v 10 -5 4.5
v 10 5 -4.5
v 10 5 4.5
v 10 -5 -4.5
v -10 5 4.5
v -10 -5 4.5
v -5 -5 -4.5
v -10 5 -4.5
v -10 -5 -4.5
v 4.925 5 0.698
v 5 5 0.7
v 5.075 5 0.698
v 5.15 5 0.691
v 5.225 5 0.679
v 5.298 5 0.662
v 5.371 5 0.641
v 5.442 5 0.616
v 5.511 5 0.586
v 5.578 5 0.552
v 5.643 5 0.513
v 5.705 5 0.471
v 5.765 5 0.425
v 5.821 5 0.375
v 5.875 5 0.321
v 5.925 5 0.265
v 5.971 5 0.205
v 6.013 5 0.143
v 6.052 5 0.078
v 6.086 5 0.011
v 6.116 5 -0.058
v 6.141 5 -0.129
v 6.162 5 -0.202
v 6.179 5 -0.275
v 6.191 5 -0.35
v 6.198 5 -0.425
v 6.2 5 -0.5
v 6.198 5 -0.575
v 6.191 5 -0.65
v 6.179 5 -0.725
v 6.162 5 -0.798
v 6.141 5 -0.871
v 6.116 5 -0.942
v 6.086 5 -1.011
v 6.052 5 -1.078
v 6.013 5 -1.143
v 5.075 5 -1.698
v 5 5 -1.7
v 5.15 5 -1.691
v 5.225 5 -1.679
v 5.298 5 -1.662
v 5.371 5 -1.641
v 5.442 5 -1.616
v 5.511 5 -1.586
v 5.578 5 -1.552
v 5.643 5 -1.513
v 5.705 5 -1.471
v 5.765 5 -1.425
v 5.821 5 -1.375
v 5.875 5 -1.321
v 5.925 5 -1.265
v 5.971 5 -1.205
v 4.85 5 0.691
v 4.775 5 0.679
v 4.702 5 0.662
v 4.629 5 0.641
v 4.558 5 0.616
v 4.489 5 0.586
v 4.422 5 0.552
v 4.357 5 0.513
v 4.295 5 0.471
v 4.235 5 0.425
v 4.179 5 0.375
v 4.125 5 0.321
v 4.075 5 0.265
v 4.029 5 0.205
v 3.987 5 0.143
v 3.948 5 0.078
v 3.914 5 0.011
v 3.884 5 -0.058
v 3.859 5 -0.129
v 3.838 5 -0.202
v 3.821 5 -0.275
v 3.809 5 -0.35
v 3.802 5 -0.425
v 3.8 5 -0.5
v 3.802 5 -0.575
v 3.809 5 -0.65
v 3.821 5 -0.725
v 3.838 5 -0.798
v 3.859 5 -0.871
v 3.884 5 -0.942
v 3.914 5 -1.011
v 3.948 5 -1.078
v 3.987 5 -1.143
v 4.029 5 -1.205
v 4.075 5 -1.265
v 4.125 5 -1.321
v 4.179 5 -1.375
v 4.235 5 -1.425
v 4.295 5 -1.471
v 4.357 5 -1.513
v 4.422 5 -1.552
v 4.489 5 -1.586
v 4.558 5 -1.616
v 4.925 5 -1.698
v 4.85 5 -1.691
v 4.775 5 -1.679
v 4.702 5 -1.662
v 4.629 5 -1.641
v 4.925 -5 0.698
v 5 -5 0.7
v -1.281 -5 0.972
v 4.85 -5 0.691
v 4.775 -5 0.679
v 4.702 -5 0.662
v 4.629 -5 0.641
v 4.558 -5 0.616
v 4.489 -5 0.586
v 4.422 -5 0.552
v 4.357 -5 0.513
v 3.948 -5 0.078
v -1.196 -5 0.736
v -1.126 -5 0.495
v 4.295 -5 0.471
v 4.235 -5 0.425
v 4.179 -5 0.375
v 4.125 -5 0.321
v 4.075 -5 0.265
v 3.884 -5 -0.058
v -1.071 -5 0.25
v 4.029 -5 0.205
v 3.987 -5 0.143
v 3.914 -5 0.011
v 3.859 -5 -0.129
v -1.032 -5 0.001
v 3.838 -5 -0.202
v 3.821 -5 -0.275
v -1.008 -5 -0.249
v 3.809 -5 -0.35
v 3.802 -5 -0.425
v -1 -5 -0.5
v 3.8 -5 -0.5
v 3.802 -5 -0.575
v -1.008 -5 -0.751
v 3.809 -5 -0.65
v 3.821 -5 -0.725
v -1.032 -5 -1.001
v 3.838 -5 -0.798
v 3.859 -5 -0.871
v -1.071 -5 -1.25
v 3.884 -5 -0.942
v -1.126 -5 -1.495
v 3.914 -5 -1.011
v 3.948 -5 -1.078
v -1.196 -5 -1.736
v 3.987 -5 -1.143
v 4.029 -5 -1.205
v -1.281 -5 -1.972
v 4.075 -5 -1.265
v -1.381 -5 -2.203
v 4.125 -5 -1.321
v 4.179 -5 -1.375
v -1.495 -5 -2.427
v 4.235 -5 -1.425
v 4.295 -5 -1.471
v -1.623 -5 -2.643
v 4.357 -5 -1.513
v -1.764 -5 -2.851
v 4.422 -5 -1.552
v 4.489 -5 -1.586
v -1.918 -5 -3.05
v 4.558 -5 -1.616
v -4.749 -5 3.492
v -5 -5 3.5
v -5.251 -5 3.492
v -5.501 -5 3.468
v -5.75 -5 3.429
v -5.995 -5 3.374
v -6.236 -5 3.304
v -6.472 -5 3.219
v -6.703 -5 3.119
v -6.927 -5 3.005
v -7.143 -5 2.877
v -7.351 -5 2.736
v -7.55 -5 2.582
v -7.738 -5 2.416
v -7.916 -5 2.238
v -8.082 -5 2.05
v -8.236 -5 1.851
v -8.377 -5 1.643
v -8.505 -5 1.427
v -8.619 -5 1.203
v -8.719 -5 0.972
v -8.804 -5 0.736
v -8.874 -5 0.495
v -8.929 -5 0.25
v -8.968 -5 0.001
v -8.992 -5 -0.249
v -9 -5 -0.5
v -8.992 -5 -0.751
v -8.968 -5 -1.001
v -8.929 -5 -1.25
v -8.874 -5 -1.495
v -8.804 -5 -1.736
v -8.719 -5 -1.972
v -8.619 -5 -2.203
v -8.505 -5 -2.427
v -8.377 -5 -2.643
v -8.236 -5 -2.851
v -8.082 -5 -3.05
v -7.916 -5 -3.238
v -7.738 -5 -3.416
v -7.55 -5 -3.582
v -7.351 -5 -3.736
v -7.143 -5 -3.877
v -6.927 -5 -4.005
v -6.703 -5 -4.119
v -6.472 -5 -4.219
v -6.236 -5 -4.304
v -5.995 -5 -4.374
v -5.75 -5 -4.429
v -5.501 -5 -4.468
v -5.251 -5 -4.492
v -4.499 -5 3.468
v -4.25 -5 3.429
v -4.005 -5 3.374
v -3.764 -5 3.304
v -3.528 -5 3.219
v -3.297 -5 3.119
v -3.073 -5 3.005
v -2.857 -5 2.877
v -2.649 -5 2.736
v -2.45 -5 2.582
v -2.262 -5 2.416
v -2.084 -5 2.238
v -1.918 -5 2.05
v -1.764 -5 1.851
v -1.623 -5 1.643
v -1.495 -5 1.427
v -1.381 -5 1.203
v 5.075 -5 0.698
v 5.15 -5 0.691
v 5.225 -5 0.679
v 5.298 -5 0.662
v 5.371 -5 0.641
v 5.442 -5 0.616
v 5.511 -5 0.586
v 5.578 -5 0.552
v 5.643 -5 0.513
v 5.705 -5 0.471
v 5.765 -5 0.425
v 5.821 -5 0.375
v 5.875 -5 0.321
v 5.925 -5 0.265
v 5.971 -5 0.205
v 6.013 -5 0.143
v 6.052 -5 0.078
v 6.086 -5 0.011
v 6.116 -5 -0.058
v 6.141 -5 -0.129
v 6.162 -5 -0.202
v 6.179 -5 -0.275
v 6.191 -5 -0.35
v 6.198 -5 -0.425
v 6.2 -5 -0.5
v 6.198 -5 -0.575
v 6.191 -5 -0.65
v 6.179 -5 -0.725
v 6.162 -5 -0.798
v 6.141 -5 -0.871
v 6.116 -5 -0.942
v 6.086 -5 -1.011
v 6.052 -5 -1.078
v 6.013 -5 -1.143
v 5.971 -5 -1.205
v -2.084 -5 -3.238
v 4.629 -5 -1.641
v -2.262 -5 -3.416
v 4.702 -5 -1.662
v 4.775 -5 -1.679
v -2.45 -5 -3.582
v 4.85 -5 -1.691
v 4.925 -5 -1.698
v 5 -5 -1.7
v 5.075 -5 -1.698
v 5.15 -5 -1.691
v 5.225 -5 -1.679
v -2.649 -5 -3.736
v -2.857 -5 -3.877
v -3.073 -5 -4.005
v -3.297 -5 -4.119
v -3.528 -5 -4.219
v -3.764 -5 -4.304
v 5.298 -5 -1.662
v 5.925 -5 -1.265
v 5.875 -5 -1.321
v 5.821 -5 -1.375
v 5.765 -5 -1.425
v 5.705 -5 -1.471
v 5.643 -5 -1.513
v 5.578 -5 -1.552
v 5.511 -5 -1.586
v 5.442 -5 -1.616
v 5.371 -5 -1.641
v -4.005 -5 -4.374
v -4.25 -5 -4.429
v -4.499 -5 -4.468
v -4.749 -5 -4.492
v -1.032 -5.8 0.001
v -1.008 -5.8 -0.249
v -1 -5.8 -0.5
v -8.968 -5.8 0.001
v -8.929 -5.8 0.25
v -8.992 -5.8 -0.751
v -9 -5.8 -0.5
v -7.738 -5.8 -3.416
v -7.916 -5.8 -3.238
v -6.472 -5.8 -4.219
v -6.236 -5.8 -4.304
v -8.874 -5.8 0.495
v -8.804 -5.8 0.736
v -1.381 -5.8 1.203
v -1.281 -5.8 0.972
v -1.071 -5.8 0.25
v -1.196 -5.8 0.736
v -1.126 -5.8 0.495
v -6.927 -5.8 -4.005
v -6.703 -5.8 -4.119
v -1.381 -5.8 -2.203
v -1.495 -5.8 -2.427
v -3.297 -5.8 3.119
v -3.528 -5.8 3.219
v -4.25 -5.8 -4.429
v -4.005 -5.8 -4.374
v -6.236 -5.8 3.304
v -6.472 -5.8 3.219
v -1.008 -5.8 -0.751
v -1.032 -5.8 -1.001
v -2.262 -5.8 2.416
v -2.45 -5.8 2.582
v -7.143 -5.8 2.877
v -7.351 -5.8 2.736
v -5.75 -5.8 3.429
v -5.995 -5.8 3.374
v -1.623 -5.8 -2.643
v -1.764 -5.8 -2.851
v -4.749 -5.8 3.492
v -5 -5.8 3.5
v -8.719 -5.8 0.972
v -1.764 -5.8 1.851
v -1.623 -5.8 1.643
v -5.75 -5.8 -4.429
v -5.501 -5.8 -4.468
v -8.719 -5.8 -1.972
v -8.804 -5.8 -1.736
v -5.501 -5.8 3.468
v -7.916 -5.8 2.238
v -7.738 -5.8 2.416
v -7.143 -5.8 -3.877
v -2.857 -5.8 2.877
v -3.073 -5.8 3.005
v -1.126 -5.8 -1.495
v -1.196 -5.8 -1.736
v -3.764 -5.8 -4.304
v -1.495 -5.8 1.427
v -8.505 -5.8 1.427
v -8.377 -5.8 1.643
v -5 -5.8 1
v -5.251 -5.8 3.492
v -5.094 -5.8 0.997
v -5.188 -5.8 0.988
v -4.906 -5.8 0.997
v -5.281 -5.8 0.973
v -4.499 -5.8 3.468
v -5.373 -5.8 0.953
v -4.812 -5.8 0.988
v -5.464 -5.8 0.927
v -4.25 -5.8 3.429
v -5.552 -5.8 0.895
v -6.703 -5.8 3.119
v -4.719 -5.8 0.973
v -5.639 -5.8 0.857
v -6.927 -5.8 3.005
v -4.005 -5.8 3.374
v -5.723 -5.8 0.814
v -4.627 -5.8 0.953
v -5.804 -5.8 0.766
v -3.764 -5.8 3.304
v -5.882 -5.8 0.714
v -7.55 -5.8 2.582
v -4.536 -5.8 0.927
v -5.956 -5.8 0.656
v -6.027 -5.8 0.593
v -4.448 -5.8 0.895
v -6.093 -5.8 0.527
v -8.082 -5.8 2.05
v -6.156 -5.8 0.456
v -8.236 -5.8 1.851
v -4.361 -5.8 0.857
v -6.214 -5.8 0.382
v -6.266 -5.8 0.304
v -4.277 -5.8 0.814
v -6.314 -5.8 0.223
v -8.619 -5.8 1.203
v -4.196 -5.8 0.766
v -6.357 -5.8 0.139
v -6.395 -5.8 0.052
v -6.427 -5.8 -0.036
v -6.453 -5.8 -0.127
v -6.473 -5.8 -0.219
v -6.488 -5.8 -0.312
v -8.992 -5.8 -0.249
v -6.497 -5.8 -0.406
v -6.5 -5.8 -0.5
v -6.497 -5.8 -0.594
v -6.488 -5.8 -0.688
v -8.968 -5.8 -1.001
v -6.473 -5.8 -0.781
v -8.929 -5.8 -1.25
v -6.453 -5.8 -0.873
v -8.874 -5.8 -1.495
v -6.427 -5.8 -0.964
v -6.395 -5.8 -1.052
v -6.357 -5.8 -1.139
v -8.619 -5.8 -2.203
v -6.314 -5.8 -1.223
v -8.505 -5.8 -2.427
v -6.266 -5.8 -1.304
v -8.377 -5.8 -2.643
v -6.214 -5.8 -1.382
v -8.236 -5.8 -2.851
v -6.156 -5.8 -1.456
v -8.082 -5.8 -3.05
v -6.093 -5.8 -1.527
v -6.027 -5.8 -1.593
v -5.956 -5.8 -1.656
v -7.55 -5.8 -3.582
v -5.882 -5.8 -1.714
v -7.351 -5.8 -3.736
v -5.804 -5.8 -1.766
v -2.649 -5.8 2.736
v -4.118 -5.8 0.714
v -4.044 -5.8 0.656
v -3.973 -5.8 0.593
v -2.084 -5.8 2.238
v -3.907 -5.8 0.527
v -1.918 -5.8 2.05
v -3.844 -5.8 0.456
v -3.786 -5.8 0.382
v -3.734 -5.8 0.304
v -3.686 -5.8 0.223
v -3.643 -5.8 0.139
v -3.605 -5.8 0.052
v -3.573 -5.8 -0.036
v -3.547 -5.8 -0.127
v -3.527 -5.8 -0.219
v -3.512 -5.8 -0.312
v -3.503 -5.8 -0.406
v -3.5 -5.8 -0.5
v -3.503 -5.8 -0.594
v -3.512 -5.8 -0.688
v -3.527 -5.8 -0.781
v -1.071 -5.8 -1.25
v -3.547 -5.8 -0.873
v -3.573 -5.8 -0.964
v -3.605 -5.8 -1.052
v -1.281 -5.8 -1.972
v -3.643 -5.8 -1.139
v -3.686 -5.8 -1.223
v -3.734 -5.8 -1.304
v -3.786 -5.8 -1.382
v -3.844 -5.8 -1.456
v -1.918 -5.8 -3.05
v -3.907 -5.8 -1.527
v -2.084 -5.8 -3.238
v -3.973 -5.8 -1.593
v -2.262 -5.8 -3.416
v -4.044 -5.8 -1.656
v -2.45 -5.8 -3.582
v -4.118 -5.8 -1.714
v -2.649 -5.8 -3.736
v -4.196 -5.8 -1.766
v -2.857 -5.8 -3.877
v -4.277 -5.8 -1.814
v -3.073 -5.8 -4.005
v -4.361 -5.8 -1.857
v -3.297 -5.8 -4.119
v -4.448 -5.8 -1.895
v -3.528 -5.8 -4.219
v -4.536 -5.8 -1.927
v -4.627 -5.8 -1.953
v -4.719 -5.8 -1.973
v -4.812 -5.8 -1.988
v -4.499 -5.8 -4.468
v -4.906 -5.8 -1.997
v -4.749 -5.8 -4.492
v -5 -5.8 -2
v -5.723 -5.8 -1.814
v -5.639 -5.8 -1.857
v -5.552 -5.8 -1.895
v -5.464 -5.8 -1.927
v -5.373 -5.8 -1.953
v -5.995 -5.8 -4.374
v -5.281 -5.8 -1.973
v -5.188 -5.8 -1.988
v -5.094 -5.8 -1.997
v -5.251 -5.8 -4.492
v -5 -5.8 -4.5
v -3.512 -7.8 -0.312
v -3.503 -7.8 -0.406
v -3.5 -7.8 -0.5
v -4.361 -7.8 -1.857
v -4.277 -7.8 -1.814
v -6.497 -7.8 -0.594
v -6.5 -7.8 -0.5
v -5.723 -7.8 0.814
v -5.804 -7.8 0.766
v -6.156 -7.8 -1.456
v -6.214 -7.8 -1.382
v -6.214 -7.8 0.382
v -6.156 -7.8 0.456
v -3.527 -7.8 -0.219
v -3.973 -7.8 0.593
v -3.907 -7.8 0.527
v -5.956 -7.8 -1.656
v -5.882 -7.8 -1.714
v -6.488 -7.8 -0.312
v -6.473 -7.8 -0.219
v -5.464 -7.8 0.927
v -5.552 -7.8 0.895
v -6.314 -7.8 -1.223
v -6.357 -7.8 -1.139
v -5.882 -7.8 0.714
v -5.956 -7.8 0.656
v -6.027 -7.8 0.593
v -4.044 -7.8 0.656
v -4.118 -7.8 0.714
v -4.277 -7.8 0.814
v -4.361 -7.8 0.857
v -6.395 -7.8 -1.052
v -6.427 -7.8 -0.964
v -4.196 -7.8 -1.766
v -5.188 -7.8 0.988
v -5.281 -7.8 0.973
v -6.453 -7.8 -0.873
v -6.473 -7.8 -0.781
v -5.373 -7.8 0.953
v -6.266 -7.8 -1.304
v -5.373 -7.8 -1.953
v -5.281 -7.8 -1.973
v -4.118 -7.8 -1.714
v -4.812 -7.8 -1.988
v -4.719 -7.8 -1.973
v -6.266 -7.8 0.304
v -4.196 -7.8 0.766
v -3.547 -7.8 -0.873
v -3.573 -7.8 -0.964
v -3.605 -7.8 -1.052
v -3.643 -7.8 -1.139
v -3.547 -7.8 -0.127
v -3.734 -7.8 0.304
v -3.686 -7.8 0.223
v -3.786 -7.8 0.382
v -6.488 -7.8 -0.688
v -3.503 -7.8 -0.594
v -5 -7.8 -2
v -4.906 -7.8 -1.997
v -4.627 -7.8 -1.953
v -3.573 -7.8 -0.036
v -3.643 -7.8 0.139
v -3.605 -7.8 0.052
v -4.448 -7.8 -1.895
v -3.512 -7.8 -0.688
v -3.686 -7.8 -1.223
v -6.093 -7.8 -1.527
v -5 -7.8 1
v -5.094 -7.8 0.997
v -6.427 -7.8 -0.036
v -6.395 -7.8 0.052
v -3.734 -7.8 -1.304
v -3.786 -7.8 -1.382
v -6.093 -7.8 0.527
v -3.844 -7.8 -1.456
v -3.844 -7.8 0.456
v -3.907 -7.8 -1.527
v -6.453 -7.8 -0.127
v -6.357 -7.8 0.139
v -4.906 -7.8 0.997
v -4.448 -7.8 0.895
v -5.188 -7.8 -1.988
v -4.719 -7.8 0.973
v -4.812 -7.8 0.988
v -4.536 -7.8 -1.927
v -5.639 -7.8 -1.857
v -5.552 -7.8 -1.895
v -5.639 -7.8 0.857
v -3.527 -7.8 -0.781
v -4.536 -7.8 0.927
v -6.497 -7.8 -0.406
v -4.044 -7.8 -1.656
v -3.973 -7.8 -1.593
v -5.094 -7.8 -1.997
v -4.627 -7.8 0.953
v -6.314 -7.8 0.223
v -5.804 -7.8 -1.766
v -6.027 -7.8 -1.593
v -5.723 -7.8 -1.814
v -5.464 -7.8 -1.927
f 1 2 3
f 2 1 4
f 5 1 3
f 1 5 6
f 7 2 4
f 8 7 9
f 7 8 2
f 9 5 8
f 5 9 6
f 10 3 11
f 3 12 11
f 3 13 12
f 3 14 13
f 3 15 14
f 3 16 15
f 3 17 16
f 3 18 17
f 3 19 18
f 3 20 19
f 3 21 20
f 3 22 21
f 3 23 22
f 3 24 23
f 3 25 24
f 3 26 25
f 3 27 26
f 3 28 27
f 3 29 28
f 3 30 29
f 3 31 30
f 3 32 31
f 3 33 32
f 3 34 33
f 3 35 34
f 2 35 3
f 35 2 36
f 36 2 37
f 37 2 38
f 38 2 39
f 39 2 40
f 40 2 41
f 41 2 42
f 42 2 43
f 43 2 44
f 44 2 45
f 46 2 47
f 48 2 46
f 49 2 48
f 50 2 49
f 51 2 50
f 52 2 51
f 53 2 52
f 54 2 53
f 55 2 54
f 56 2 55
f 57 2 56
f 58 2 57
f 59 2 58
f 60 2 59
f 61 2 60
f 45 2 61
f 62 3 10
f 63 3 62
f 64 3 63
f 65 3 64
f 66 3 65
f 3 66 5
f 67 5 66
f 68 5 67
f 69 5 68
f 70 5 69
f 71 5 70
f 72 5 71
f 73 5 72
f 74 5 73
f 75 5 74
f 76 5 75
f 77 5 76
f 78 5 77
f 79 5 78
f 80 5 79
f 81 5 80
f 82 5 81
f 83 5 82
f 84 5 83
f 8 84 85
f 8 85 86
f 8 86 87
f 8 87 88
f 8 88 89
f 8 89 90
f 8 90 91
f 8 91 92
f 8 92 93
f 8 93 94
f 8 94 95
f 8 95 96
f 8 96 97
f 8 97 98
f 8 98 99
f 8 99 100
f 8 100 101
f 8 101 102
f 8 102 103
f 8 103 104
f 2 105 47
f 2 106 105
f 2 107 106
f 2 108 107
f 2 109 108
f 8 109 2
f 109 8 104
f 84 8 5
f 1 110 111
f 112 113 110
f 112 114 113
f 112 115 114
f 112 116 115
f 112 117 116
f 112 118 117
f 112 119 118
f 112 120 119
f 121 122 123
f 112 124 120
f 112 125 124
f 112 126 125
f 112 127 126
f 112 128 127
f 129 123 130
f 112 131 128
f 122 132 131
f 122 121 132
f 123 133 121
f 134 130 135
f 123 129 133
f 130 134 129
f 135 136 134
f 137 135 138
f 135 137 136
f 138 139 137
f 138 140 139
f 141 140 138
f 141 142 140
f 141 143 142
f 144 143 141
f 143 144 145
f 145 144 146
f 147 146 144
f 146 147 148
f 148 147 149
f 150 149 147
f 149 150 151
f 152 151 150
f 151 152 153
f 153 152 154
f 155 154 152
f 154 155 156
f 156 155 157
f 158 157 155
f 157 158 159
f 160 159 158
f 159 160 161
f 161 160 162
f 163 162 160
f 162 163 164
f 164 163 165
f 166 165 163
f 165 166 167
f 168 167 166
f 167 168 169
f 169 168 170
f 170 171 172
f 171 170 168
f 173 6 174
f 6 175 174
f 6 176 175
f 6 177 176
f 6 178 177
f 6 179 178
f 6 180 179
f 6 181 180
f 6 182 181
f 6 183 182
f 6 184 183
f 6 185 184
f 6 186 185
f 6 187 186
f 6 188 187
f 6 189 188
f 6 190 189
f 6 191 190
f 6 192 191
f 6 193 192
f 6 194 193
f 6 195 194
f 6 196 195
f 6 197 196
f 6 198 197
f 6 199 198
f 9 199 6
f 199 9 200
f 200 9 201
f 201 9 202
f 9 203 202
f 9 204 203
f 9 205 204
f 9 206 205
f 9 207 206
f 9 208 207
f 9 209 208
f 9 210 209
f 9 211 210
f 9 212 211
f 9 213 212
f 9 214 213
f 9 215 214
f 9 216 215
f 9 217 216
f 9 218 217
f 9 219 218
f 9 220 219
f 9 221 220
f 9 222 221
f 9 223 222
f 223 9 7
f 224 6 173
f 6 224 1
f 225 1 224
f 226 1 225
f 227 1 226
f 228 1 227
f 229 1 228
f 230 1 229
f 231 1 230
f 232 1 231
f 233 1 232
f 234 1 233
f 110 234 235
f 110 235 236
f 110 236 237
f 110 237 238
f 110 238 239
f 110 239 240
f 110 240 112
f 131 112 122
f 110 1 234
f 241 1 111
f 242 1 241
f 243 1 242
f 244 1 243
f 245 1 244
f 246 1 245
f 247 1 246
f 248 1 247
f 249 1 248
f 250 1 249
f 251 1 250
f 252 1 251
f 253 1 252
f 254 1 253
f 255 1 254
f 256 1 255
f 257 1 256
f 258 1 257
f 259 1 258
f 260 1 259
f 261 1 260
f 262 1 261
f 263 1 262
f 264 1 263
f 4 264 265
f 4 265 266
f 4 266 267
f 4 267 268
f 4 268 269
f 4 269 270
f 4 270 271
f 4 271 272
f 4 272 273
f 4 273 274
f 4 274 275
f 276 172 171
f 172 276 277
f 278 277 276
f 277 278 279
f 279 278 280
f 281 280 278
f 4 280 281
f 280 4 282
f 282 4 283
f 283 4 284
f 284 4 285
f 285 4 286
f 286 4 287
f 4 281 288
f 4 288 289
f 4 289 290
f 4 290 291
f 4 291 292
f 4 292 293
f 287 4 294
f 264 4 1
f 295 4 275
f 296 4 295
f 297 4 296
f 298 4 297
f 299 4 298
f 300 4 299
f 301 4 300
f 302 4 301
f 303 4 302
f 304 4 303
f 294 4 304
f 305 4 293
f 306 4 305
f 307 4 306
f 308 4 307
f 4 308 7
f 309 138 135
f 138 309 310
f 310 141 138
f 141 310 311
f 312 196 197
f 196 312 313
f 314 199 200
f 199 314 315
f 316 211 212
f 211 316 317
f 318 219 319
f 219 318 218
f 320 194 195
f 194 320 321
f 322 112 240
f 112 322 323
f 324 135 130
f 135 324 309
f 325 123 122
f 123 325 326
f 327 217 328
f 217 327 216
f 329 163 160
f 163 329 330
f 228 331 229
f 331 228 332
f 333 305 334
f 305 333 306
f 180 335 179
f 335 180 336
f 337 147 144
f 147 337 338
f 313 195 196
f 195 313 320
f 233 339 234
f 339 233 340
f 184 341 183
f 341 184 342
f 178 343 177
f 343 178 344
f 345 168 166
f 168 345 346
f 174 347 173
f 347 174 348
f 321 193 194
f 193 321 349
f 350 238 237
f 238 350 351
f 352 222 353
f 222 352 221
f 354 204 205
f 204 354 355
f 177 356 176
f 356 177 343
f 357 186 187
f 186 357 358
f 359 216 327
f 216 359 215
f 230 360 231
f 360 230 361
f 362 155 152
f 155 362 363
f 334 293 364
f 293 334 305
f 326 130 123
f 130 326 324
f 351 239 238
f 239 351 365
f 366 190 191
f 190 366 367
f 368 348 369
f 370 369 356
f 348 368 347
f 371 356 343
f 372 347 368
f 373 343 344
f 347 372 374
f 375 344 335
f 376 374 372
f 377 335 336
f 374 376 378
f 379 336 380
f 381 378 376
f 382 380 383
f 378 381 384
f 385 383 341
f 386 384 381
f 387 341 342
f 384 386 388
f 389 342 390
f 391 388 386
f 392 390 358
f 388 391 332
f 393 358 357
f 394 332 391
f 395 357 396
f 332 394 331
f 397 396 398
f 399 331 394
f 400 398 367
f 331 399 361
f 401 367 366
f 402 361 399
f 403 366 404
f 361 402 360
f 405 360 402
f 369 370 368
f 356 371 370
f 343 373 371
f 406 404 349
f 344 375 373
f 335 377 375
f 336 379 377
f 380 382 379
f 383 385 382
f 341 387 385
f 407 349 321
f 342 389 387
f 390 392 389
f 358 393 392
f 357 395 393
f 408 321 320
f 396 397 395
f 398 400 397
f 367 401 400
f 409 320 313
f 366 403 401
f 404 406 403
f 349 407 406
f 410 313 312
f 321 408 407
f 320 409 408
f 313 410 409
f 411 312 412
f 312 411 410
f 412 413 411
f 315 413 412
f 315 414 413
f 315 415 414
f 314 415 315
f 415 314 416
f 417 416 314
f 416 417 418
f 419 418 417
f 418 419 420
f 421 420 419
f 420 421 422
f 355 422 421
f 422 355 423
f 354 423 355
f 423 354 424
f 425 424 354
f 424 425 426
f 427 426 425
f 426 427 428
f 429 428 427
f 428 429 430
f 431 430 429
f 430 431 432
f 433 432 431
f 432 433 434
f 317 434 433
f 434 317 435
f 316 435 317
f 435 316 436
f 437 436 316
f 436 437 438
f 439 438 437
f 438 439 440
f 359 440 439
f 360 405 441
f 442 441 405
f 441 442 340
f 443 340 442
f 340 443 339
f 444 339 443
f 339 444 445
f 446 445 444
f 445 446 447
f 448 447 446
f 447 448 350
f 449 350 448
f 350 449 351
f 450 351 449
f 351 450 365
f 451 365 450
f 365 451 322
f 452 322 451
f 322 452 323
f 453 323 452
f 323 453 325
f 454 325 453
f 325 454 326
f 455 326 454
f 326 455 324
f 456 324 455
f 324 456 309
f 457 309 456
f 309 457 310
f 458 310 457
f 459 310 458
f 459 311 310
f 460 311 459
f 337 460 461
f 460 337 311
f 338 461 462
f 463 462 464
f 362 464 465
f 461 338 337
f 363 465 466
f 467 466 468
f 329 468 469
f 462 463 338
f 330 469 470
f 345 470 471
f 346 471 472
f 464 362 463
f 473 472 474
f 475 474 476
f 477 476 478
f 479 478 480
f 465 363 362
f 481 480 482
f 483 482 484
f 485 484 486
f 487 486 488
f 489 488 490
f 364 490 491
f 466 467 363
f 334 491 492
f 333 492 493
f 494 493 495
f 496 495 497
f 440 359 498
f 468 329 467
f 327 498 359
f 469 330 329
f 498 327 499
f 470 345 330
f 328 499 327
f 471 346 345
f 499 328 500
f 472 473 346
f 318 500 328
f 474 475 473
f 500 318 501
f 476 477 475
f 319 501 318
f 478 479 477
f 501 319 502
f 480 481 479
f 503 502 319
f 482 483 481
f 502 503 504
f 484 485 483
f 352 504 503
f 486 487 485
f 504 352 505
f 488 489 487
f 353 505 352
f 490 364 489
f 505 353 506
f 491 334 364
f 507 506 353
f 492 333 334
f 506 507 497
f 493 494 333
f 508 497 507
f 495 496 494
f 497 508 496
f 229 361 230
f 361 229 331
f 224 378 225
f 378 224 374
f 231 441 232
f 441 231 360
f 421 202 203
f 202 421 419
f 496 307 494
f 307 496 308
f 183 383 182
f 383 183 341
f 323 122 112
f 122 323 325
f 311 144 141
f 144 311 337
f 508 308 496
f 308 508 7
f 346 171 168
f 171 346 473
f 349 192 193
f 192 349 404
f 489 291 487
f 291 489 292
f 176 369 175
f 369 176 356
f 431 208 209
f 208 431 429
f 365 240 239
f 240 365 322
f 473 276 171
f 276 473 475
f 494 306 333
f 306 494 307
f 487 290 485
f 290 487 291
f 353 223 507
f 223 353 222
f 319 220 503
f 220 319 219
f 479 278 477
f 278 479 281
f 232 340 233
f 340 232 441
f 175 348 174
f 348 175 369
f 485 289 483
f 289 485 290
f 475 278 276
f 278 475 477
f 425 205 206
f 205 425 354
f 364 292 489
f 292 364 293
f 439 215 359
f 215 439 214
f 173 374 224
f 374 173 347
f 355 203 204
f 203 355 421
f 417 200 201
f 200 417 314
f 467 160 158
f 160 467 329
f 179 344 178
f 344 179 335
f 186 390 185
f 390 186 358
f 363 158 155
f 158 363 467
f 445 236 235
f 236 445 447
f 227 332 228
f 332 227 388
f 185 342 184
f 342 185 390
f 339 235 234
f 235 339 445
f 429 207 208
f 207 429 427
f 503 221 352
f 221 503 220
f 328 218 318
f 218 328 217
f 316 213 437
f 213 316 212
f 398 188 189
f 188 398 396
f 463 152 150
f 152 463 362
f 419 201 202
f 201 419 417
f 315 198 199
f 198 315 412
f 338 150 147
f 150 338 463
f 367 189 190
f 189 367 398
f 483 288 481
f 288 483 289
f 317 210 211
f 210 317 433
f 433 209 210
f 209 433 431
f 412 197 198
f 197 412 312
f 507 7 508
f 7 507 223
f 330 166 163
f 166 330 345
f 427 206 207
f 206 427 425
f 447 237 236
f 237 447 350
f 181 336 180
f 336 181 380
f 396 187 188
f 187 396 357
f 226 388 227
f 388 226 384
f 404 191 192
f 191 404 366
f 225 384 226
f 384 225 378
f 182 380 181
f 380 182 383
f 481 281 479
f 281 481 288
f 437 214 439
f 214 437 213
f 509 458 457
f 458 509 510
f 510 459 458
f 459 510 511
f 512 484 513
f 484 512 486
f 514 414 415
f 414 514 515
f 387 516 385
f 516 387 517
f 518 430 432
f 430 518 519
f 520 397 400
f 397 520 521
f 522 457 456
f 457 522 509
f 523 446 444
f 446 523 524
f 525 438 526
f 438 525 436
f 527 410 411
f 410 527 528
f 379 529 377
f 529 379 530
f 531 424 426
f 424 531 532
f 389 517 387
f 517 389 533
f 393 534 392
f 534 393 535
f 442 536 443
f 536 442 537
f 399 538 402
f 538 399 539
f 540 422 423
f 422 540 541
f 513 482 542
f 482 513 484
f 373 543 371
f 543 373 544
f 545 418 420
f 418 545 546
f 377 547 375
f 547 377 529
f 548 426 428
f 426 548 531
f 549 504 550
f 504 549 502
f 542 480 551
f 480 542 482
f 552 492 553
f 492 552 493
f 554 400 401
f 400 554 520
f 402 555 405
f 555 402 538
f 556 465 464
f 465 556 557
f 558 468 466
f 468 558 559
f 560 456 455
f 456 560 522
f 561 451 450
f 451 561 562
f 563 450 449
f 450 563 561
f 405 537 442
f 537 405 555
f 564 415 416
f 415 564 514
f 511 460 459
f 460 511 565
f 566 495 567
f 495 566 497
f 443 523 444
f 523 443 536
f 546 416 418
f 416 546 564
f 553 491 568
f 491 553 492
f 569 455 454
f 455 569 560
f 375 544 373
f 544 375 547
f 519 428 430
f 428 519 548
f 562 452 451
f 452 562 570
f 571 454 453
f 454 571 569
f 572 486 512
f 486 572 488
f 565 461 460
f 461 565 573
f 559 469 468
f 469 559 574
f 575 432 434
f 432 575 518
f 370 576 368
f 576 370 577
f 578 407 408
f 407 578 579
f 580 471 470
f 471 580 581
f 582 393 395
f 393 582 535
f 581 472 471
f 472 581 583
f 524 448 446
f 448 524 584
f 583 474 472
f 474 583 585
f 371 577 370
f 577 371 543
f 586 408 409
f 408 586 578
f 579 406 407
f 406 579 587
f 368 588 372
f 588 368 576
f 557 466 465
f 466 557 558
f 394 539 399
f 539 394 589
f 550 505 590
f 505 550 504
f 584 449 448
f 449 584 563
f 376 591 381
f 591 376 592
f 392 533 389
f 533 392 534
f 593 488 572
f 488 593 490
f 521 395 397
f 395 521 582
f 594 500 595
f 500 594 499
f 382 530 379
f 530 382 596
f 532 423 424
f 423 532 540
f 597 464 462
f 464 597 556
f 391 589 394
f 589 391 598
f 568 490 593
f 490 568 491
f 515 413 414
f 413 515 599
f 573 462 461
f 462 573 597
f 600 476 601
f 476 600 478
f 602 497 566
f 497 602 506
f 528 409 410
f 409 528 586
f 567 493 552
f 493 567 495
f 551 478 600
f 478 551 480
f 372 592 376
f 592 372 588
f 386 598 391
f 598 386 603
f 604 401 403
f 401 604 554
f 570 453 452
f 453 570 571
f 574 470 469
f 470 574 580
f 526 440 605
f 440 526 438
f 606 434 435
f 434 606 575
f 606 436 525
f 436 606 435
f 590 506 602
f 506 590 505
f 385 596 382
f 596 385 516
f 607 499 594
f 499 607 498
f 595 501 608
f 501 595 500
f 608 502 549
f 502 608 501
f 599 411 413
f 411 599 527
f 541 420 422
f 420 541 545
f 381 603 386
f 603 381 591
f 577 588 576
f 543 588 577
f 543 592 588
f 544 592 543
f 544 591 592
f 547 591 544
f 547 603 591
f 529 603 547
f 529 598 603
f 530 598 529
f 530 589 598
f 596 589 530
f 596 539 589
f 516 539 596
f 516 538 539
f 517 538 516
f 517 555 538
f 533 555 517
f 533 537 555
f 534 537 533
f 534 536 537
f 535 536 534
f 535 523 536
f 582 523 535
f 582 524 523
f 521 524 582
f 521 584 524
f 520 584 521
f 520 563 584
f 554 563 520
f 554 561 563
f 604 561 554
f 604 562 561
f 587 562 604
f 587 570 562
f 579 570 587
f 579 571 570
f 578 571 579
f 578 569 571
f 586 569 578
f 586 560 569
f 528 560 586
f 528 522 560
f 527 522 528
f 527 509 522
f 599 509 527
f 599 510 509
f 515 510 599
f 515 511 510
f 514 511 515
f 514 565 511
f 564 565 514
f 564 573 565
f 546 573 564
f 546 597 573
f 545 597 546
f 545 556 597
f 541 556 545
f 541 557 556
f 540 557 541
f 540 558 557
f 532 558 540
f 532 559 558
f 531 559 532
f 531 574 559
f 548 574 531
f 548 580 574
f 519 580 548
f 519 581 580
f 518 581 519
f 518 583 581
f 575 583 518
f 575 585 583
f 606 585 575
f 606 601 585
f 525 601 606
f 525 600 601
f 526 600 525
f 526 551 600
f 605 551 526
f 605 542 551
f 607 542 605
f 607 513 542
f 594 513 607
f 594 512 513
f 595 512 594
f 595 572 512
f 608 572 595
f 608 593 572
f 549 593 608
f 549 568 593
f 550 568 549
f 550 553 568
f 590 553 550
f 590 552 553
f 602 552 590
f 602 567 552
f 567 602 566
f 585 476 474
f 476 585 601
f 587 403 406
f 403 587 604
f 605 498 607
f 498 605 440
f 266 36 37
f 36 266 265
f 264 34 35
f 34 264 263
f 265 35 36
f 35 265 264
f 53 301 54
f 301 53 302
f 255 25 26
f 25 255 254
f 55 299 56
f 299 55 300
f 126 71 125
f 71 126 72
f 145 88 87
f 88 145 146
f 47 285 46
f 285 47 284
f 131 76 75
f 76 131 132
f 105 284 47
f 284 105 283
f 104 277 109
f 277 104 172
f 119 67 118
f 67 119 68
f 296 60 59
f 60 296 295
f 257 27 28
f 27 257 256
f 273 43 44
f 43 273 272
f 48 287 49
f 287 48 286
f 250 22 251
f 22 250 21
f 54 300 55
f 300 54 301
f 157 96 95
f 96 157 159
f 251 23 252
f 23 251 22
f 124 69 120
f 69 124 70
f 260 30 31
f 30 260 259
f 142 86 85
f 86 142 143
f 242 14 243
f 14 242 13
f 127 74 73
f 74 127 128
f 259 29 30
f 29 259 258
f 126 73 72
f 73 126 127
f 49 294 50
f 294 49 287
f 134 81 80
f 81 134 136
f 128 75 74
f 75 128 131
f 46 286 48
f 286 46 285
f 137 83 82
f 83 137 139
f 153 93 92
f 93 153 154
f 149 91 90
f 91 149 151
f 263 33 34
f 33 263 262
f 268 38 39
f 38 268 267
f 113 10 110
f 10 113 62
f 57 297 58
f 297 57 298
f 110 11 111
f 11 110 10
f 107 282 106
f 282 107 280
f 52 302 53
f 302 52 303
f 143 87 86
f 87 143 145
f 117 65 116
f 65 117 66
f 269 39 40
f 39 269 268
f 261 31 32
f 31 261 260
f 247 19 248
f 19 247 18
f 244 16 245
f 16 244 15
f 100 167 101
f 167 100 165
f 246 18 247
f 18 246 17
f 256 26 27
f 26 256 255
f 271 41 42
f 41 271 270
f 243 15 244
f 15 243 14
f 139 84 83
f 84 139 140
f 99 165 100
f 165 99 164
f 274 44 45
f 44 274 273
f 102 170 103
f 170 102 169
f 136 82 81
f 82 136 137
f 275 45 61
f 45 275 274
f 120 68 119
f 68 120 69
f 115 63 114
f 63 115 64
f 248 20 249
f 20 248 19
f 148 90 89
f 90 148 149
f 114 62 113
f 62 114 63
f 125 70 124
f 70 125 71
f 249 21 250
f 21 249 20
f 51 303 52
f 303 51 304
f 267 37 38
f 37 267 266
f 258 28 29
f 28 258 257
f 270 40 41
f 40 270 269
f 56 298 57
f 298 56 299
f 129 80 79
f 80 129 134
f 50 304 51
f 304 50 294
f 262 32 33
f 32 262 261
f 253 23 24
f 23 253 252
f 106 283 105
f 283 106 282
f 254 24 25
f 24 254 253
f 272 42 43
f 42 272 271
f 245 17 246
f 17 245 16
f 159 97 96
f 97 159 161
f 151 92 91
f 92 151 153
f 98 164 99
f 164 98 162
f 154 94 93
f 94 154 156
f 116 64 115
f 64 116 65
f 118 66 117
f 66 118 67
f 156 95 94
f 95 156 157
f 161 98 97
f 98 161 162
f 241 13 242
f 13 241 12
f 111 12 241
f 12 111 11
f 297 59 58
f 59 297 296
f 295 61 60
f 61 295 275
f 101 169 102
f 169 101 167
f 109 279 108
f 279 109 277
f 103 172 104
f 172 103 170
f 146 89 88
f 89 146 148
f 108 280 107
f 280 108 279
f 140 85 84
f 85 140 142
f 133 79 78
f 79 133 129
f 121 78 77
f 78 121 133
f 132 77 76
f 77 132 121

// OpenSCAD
$fn = 100;

module IR_Break_Beam_Model() {

    body_len = 20;
    body_w = 10;
    body_h = 9;

    front_ring_d = 8;
    front_ring_out = 0.8;

    led_d = 3;
    led_out = 2;

    screw_d = 2.4;

    led_x = -body_len/2 + 1 + front_ring_d/2;
    led_z = body_h/2 - 1 - front_ring_d/2;

    screw_x = led_x + 10;
    screw_z = led_z;

    difference() {

        union() {

            // Main body
            color("black")
                cube([body_len, body_w, body_h], center = true);

            // Raised ring around LED
            color("black")
                translate([led_x, -body_w/2, led_z])
                    rotate([90, 0, 0])
                        cylinder(h = front_ring_out, d = front_ring_d);

            // LED
            color("gray")
                translate([led_x, -body_w/2 - front_ring_out, led_z])
                    rotate([90, 0, 0])
                        cylinder(h = led_out, d = led_d);
        }

        // Screw hole
        translate([screw_x, 0, screw_z])
            rotate([90, 0, 0])
                cylinder(h = body_w + 4, d = screw_d, center = true);
    }
}

IR_Break_Beam_Model();
